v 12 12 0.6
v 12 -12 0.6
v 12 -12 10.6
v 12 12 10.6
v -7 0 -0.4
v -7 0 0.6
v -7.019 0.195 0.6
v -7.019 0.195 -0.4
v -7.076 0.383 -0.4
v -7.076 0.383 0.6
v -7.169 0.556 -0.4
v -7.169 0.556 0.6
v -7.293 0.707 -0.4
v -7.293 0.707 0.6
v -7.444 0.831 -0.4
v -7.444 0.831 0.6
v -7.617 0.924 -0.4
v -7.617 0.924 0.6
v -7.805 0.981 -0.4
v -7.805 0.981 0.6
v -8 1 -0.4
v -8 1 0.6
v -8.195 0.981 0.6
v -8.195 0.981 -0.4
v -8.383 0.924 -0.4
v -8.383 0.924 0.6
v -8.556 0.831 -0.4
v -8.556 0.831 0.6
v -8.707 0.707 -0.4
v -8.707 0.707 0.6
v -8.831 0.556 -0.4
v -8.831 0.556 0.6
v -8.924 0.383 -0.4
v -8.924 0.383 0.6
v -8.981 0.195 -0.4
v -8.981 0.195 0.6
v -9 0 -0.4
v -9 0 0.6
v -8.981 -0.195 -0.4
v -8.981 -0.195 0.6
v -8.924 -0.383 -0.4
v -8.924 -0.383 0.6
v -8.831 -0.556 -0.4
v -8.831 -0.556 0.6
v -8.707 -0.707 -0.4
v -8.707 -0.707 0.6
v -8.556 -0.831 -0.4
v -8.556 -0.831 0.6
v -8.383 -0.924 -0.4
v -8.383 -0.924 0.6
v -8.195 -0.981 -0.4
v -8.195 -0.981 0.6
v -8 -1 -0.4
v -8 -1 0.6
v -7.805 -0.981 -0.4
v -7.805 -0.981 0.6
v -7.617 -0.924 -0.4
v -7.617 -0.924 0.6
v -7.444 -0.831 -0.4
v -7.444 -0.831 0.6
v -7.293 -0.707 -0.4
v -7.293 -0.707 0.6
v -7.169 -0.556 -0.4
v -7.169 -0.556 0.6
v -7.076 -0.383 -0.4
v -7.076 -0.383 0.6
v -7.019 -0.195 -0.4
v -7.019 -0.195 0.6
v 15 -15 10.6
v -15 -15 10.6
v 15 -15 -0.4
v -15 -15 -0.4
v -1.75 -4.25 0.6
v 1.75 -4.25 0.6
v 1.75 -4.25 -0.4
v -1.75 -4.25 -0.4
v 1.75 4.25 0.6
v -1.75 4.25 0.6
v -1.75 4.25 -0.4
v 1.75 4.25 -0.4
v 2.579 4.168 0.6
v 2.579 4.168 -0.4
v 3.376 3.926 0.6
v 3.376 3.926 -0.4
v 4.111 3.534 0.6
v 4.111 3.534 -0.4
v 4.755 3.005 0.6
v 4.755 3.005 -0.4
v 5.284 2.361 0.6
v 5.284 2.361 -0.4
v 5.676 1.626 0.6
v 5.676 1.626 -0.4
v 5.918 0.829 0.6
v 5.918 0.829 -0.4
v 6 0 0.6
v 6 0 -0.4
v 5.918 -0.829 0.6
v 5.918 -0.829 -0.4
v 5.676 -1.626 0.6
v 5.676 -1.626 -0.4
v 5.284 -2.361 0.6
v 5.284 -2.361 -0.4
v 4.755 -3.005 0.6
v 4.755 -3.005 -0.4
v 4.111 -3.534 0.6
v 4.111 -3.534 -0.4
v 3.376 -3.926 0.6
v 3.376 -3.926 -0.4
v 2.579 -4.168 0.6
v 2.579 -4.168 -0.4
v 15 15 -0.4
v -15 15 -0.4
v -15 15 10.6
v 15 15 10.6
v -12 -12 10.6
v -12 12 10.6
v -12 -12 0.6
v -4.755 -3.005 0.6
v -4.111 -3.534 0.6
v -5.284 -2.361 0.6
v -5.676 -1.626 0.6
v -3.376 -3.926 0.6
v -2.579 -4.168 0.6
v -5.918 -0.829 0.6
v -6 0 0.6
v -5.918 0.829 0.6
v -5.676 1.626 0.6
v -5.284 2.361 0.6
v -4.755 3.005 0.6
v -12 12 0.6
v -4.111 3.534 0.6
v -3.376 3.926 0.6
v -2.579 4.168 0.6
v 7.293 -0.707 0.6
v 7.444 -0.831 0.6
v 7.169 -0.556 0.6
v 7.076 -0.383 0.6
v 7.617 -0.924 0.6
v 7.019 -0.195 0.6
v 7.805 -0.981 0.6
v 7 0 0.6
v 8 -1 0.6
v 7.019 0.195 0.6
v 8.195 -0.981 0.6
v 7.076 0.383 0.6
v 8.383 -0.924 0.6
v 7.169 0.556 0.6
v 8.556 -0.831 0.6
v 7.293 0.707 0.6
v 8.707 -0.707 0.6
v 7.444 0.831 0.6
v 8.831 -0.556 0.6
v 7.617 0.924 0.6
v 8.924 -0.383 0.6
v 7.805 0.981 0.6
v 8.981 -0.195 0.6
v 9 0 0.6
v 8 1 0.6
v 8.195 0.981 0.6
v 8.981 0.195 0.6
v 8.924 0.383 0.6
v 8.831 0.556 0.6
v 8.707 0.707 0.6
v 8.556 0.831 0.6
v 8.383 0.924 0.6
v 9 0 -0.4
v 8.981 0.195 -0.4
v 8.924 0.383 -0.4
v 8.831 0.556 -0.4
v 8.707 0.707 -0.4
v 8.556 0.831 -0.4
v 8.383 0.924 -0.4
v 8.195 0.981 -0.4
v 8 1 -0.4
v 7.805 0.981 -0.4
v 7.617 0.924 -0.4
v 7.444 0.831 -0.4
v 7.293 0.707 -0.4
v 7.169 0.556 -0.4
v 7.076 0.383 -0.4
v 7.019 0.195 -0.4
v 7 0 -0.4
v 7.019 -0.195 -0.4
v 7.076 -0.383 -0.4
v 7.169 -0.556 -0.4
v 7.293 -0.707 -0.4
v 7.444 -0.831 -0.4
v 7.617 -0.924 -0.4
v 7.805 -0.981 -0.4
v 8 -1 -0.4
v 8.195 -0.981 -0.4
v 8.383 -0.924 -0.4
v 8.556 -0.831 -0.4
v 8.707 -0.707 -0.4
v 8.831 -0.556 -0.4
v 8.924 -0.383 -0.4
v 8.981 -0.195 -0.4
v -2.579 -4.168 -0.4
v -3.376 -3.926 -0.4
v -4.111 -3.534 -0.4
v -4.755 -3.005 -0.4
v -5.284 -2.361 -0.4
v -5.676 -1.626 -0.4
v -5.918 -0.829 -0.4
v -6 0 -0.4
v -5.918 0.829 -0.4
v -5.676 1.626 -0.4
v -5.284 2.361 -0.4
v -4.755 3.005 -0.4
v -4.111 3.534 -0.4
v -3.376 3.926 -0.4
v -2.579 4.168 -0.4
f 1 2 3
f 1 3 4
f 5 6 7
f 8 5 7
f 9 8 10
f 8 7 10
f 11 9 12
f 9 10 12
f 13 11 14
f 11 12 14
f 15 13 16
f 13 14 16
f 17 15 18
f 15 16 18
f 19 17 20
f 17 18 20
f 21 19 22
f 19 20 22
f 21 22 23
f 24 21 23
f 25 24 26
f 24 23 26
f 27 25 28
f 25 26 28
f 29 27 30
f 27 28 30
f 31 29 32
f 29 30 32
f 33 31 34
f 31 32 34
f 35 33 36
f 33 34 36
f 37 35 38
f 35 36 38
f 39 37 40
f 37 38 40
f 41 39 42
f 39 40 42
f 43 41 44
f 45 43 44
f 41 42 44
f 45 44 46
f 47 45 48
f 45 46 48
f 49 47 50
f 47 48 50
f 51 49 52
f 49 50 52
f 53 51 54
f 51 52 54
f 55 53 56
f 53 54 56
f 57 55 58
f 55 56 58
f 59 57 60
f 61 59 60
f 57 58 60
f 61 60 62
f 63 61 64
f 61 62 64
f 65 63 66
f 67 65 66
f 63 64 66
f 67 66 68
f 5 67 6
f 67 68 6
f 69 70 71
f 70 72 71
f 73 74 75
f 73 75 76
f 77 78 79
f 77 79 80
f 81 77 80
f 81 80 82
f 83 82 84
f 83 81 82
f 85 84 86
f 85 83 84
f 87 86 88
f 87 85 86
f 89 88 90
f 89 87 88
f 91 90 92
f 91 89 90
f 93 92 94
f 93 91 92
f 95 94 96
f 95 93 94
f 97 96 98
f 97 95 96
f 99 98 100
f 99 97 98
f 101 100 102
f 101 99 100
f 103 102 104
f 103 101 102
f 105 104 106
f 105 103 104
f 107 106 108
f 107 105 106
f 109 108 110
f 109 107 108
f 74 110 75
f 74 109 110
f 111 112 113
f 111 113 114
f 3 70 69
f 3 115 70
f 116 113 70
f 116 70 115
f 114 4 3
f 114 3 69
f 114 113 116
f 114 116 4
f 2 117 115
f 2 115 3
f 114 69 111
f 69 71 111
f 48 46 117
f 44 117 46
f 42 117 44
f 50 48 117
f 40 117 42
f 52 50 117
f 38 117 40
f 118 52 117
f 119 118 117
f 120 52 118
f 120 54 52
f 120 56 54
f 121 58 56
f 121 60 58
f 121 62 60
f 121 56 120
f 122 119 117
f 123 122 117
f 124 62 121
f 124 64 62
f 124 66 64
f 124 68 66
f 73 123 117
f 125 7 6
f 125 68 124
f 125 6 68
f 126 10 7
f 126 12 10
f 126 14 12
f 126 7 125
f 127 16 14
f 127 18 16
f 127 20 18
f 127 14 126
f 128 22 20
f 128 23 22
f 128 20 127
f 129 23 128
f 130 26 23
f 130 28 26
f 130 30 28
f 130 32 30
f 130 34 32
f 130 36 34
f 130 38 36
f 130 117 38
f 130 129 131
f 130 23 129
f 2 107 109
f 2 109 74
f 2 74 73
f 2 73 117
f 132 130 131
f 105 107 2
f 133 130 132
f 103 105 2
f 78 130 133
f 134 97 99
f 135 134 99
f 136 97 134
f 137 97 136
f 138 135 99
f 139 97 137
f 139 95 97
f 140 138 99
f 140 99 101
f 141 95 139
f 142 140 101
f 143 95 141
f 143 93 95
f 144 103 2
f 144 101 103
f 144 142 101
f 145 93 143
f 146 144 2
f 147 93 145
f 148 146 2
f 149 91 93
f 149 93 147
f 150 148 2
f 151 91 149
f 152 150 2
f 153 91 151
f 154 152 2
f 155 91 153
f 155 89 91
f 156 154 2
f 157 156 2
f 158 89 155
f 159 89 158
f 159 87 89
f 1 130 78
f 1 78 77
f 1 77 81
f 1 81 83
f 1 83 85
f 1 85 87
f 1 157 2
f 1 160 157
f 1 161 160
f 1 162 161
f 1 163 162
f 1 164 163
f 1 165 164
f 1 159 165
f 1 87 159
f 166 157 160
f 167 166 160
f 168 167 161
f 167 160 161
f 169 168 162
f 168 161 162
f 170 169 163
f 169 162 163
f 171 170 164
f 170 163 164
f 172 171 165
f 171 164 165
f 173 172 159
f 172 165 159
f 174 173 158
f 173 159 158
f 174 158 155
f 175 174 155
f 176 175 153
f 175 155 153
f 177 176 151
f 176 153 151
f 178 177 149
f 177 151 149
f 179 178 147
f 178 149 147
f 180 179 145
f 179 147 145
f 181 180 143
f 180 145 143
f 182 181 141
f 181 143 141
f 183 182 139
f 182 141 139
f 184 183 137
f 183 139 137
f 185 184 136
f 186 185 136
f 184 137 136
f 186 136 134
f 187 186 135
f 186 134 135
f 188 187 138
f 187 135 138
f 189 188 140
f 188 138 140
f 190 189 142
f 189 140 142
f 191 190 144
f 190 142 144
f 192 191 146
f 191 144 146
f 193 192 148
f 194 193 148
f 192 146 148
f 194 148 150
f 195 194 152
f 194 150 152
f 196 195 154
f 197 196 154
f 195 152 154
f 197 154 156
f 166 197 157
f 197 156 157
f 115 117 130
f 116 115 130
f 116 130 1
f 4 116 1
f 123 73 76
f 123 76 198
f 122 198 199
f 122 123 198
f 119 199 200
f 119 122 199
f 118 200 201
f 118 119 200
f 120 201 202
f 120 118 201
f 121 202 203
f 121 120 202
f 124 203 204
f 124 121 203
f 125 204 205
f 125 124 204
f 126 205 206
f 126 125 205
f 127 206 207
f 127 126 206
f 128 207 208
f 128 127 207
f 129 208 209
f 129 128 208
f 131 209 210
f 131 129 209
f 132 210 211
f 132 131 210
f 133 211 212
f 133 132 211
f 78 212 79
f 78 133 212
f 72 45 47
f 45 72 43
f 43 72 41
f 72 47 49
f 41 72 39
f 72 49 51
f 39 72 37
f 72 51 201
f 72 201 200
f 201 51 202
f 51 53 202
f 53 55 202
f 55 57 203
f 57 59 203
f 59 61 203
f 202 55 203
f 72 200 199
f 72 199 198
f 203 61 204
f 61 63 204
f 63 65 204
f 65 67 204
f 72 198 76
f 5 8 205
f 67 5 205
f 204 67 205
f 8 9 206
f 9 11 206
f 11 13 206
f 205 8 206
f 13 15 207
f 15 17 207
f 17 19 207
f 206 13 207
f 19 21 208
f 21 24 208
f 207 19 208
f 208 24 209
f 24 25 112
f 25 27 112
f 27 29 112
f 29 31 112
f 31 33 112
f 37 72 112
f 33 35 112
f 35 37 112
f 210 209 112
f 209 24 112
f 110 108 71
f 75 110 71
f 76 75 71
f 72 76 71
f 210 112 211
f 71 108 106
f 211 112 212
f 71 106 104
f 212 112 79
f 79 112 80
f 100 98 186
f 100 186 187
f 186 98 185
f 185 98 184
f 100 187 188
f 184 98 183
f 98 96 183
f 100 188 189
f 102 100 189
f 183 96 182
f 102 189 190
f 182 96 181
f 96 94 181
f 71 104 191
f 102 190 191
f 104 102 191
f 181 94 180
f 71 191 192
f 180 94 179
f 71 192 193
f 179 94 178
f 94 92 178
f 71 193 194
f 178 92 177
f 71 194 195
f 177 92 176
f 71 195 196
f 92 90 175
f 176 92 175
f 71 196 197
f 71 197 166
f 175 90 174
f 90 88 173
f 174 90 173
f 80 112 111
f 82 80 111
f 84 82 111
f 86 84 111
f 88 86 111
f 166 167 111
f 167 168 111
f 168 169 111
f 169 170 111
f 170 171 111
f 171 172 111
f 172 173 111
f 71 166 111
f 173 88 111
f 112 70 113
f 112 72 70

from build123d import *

# Parameters (mm, degrees)
CROQUIS1_W              = 30
CROQUIS1_H              = 30
CROQUIS1_R              = 1
SALIENTE_EXTRUIR2_DEPTH = 1
CROQUIS2_W              = 30
CROQUIS2_H              = 30
CROQUIS2_W_2            = 24
CROQUIS2_H_2            = 24
SALIENTE_EXTRUIR3_DEPTH = 10


with BuildPart() as part:
    # Croquis1 → Saliente-Extruir2 (new body)
    with BuildSketch(Plane.XY.offset(0.6)):
        Rectangle(CROQUIS1_W, CROQUIS1_H)
        with Locations((-8, 0)):
            Circle(CROQUIS1_R, mode=Mode.SUBTRACT)
        with Locations((8, 0)):
            Circle(CROQUIS1_R, mode=Mode.SUBTRACT)
        with BuildLine():
            Line((-1.75, 4.25), (1.75, 4.25))
            ThreePointArc((1.75, 4.25), (6, 0), (1.75, -4.25))
            Line((1.75, -4.25), (-1.75, -4.25))
            ThreePointArc((-1.75, -4.25), (-6, 0), (-1.75, 4.25))
        make_face(mode=Mode.SUBTRACT)
    extrude(amount=-SALIENTE_EXTRUIR2_DEPTH)

    # Croquis2 → Saliente-Extruir3 (add)
    with BuildSketch(Plane.XY.offset(0.6)):
        Rectangle(CROQUIS2_W, CROQUIS2_H)
        Rectangle(CROQUIS2_W_2, CROQUIS2_H_2, mode=Mode.SUBTRACT)
    extrude(amount=SALIENTE_EXTRUIR3_DEPTH)


solid = part.part
